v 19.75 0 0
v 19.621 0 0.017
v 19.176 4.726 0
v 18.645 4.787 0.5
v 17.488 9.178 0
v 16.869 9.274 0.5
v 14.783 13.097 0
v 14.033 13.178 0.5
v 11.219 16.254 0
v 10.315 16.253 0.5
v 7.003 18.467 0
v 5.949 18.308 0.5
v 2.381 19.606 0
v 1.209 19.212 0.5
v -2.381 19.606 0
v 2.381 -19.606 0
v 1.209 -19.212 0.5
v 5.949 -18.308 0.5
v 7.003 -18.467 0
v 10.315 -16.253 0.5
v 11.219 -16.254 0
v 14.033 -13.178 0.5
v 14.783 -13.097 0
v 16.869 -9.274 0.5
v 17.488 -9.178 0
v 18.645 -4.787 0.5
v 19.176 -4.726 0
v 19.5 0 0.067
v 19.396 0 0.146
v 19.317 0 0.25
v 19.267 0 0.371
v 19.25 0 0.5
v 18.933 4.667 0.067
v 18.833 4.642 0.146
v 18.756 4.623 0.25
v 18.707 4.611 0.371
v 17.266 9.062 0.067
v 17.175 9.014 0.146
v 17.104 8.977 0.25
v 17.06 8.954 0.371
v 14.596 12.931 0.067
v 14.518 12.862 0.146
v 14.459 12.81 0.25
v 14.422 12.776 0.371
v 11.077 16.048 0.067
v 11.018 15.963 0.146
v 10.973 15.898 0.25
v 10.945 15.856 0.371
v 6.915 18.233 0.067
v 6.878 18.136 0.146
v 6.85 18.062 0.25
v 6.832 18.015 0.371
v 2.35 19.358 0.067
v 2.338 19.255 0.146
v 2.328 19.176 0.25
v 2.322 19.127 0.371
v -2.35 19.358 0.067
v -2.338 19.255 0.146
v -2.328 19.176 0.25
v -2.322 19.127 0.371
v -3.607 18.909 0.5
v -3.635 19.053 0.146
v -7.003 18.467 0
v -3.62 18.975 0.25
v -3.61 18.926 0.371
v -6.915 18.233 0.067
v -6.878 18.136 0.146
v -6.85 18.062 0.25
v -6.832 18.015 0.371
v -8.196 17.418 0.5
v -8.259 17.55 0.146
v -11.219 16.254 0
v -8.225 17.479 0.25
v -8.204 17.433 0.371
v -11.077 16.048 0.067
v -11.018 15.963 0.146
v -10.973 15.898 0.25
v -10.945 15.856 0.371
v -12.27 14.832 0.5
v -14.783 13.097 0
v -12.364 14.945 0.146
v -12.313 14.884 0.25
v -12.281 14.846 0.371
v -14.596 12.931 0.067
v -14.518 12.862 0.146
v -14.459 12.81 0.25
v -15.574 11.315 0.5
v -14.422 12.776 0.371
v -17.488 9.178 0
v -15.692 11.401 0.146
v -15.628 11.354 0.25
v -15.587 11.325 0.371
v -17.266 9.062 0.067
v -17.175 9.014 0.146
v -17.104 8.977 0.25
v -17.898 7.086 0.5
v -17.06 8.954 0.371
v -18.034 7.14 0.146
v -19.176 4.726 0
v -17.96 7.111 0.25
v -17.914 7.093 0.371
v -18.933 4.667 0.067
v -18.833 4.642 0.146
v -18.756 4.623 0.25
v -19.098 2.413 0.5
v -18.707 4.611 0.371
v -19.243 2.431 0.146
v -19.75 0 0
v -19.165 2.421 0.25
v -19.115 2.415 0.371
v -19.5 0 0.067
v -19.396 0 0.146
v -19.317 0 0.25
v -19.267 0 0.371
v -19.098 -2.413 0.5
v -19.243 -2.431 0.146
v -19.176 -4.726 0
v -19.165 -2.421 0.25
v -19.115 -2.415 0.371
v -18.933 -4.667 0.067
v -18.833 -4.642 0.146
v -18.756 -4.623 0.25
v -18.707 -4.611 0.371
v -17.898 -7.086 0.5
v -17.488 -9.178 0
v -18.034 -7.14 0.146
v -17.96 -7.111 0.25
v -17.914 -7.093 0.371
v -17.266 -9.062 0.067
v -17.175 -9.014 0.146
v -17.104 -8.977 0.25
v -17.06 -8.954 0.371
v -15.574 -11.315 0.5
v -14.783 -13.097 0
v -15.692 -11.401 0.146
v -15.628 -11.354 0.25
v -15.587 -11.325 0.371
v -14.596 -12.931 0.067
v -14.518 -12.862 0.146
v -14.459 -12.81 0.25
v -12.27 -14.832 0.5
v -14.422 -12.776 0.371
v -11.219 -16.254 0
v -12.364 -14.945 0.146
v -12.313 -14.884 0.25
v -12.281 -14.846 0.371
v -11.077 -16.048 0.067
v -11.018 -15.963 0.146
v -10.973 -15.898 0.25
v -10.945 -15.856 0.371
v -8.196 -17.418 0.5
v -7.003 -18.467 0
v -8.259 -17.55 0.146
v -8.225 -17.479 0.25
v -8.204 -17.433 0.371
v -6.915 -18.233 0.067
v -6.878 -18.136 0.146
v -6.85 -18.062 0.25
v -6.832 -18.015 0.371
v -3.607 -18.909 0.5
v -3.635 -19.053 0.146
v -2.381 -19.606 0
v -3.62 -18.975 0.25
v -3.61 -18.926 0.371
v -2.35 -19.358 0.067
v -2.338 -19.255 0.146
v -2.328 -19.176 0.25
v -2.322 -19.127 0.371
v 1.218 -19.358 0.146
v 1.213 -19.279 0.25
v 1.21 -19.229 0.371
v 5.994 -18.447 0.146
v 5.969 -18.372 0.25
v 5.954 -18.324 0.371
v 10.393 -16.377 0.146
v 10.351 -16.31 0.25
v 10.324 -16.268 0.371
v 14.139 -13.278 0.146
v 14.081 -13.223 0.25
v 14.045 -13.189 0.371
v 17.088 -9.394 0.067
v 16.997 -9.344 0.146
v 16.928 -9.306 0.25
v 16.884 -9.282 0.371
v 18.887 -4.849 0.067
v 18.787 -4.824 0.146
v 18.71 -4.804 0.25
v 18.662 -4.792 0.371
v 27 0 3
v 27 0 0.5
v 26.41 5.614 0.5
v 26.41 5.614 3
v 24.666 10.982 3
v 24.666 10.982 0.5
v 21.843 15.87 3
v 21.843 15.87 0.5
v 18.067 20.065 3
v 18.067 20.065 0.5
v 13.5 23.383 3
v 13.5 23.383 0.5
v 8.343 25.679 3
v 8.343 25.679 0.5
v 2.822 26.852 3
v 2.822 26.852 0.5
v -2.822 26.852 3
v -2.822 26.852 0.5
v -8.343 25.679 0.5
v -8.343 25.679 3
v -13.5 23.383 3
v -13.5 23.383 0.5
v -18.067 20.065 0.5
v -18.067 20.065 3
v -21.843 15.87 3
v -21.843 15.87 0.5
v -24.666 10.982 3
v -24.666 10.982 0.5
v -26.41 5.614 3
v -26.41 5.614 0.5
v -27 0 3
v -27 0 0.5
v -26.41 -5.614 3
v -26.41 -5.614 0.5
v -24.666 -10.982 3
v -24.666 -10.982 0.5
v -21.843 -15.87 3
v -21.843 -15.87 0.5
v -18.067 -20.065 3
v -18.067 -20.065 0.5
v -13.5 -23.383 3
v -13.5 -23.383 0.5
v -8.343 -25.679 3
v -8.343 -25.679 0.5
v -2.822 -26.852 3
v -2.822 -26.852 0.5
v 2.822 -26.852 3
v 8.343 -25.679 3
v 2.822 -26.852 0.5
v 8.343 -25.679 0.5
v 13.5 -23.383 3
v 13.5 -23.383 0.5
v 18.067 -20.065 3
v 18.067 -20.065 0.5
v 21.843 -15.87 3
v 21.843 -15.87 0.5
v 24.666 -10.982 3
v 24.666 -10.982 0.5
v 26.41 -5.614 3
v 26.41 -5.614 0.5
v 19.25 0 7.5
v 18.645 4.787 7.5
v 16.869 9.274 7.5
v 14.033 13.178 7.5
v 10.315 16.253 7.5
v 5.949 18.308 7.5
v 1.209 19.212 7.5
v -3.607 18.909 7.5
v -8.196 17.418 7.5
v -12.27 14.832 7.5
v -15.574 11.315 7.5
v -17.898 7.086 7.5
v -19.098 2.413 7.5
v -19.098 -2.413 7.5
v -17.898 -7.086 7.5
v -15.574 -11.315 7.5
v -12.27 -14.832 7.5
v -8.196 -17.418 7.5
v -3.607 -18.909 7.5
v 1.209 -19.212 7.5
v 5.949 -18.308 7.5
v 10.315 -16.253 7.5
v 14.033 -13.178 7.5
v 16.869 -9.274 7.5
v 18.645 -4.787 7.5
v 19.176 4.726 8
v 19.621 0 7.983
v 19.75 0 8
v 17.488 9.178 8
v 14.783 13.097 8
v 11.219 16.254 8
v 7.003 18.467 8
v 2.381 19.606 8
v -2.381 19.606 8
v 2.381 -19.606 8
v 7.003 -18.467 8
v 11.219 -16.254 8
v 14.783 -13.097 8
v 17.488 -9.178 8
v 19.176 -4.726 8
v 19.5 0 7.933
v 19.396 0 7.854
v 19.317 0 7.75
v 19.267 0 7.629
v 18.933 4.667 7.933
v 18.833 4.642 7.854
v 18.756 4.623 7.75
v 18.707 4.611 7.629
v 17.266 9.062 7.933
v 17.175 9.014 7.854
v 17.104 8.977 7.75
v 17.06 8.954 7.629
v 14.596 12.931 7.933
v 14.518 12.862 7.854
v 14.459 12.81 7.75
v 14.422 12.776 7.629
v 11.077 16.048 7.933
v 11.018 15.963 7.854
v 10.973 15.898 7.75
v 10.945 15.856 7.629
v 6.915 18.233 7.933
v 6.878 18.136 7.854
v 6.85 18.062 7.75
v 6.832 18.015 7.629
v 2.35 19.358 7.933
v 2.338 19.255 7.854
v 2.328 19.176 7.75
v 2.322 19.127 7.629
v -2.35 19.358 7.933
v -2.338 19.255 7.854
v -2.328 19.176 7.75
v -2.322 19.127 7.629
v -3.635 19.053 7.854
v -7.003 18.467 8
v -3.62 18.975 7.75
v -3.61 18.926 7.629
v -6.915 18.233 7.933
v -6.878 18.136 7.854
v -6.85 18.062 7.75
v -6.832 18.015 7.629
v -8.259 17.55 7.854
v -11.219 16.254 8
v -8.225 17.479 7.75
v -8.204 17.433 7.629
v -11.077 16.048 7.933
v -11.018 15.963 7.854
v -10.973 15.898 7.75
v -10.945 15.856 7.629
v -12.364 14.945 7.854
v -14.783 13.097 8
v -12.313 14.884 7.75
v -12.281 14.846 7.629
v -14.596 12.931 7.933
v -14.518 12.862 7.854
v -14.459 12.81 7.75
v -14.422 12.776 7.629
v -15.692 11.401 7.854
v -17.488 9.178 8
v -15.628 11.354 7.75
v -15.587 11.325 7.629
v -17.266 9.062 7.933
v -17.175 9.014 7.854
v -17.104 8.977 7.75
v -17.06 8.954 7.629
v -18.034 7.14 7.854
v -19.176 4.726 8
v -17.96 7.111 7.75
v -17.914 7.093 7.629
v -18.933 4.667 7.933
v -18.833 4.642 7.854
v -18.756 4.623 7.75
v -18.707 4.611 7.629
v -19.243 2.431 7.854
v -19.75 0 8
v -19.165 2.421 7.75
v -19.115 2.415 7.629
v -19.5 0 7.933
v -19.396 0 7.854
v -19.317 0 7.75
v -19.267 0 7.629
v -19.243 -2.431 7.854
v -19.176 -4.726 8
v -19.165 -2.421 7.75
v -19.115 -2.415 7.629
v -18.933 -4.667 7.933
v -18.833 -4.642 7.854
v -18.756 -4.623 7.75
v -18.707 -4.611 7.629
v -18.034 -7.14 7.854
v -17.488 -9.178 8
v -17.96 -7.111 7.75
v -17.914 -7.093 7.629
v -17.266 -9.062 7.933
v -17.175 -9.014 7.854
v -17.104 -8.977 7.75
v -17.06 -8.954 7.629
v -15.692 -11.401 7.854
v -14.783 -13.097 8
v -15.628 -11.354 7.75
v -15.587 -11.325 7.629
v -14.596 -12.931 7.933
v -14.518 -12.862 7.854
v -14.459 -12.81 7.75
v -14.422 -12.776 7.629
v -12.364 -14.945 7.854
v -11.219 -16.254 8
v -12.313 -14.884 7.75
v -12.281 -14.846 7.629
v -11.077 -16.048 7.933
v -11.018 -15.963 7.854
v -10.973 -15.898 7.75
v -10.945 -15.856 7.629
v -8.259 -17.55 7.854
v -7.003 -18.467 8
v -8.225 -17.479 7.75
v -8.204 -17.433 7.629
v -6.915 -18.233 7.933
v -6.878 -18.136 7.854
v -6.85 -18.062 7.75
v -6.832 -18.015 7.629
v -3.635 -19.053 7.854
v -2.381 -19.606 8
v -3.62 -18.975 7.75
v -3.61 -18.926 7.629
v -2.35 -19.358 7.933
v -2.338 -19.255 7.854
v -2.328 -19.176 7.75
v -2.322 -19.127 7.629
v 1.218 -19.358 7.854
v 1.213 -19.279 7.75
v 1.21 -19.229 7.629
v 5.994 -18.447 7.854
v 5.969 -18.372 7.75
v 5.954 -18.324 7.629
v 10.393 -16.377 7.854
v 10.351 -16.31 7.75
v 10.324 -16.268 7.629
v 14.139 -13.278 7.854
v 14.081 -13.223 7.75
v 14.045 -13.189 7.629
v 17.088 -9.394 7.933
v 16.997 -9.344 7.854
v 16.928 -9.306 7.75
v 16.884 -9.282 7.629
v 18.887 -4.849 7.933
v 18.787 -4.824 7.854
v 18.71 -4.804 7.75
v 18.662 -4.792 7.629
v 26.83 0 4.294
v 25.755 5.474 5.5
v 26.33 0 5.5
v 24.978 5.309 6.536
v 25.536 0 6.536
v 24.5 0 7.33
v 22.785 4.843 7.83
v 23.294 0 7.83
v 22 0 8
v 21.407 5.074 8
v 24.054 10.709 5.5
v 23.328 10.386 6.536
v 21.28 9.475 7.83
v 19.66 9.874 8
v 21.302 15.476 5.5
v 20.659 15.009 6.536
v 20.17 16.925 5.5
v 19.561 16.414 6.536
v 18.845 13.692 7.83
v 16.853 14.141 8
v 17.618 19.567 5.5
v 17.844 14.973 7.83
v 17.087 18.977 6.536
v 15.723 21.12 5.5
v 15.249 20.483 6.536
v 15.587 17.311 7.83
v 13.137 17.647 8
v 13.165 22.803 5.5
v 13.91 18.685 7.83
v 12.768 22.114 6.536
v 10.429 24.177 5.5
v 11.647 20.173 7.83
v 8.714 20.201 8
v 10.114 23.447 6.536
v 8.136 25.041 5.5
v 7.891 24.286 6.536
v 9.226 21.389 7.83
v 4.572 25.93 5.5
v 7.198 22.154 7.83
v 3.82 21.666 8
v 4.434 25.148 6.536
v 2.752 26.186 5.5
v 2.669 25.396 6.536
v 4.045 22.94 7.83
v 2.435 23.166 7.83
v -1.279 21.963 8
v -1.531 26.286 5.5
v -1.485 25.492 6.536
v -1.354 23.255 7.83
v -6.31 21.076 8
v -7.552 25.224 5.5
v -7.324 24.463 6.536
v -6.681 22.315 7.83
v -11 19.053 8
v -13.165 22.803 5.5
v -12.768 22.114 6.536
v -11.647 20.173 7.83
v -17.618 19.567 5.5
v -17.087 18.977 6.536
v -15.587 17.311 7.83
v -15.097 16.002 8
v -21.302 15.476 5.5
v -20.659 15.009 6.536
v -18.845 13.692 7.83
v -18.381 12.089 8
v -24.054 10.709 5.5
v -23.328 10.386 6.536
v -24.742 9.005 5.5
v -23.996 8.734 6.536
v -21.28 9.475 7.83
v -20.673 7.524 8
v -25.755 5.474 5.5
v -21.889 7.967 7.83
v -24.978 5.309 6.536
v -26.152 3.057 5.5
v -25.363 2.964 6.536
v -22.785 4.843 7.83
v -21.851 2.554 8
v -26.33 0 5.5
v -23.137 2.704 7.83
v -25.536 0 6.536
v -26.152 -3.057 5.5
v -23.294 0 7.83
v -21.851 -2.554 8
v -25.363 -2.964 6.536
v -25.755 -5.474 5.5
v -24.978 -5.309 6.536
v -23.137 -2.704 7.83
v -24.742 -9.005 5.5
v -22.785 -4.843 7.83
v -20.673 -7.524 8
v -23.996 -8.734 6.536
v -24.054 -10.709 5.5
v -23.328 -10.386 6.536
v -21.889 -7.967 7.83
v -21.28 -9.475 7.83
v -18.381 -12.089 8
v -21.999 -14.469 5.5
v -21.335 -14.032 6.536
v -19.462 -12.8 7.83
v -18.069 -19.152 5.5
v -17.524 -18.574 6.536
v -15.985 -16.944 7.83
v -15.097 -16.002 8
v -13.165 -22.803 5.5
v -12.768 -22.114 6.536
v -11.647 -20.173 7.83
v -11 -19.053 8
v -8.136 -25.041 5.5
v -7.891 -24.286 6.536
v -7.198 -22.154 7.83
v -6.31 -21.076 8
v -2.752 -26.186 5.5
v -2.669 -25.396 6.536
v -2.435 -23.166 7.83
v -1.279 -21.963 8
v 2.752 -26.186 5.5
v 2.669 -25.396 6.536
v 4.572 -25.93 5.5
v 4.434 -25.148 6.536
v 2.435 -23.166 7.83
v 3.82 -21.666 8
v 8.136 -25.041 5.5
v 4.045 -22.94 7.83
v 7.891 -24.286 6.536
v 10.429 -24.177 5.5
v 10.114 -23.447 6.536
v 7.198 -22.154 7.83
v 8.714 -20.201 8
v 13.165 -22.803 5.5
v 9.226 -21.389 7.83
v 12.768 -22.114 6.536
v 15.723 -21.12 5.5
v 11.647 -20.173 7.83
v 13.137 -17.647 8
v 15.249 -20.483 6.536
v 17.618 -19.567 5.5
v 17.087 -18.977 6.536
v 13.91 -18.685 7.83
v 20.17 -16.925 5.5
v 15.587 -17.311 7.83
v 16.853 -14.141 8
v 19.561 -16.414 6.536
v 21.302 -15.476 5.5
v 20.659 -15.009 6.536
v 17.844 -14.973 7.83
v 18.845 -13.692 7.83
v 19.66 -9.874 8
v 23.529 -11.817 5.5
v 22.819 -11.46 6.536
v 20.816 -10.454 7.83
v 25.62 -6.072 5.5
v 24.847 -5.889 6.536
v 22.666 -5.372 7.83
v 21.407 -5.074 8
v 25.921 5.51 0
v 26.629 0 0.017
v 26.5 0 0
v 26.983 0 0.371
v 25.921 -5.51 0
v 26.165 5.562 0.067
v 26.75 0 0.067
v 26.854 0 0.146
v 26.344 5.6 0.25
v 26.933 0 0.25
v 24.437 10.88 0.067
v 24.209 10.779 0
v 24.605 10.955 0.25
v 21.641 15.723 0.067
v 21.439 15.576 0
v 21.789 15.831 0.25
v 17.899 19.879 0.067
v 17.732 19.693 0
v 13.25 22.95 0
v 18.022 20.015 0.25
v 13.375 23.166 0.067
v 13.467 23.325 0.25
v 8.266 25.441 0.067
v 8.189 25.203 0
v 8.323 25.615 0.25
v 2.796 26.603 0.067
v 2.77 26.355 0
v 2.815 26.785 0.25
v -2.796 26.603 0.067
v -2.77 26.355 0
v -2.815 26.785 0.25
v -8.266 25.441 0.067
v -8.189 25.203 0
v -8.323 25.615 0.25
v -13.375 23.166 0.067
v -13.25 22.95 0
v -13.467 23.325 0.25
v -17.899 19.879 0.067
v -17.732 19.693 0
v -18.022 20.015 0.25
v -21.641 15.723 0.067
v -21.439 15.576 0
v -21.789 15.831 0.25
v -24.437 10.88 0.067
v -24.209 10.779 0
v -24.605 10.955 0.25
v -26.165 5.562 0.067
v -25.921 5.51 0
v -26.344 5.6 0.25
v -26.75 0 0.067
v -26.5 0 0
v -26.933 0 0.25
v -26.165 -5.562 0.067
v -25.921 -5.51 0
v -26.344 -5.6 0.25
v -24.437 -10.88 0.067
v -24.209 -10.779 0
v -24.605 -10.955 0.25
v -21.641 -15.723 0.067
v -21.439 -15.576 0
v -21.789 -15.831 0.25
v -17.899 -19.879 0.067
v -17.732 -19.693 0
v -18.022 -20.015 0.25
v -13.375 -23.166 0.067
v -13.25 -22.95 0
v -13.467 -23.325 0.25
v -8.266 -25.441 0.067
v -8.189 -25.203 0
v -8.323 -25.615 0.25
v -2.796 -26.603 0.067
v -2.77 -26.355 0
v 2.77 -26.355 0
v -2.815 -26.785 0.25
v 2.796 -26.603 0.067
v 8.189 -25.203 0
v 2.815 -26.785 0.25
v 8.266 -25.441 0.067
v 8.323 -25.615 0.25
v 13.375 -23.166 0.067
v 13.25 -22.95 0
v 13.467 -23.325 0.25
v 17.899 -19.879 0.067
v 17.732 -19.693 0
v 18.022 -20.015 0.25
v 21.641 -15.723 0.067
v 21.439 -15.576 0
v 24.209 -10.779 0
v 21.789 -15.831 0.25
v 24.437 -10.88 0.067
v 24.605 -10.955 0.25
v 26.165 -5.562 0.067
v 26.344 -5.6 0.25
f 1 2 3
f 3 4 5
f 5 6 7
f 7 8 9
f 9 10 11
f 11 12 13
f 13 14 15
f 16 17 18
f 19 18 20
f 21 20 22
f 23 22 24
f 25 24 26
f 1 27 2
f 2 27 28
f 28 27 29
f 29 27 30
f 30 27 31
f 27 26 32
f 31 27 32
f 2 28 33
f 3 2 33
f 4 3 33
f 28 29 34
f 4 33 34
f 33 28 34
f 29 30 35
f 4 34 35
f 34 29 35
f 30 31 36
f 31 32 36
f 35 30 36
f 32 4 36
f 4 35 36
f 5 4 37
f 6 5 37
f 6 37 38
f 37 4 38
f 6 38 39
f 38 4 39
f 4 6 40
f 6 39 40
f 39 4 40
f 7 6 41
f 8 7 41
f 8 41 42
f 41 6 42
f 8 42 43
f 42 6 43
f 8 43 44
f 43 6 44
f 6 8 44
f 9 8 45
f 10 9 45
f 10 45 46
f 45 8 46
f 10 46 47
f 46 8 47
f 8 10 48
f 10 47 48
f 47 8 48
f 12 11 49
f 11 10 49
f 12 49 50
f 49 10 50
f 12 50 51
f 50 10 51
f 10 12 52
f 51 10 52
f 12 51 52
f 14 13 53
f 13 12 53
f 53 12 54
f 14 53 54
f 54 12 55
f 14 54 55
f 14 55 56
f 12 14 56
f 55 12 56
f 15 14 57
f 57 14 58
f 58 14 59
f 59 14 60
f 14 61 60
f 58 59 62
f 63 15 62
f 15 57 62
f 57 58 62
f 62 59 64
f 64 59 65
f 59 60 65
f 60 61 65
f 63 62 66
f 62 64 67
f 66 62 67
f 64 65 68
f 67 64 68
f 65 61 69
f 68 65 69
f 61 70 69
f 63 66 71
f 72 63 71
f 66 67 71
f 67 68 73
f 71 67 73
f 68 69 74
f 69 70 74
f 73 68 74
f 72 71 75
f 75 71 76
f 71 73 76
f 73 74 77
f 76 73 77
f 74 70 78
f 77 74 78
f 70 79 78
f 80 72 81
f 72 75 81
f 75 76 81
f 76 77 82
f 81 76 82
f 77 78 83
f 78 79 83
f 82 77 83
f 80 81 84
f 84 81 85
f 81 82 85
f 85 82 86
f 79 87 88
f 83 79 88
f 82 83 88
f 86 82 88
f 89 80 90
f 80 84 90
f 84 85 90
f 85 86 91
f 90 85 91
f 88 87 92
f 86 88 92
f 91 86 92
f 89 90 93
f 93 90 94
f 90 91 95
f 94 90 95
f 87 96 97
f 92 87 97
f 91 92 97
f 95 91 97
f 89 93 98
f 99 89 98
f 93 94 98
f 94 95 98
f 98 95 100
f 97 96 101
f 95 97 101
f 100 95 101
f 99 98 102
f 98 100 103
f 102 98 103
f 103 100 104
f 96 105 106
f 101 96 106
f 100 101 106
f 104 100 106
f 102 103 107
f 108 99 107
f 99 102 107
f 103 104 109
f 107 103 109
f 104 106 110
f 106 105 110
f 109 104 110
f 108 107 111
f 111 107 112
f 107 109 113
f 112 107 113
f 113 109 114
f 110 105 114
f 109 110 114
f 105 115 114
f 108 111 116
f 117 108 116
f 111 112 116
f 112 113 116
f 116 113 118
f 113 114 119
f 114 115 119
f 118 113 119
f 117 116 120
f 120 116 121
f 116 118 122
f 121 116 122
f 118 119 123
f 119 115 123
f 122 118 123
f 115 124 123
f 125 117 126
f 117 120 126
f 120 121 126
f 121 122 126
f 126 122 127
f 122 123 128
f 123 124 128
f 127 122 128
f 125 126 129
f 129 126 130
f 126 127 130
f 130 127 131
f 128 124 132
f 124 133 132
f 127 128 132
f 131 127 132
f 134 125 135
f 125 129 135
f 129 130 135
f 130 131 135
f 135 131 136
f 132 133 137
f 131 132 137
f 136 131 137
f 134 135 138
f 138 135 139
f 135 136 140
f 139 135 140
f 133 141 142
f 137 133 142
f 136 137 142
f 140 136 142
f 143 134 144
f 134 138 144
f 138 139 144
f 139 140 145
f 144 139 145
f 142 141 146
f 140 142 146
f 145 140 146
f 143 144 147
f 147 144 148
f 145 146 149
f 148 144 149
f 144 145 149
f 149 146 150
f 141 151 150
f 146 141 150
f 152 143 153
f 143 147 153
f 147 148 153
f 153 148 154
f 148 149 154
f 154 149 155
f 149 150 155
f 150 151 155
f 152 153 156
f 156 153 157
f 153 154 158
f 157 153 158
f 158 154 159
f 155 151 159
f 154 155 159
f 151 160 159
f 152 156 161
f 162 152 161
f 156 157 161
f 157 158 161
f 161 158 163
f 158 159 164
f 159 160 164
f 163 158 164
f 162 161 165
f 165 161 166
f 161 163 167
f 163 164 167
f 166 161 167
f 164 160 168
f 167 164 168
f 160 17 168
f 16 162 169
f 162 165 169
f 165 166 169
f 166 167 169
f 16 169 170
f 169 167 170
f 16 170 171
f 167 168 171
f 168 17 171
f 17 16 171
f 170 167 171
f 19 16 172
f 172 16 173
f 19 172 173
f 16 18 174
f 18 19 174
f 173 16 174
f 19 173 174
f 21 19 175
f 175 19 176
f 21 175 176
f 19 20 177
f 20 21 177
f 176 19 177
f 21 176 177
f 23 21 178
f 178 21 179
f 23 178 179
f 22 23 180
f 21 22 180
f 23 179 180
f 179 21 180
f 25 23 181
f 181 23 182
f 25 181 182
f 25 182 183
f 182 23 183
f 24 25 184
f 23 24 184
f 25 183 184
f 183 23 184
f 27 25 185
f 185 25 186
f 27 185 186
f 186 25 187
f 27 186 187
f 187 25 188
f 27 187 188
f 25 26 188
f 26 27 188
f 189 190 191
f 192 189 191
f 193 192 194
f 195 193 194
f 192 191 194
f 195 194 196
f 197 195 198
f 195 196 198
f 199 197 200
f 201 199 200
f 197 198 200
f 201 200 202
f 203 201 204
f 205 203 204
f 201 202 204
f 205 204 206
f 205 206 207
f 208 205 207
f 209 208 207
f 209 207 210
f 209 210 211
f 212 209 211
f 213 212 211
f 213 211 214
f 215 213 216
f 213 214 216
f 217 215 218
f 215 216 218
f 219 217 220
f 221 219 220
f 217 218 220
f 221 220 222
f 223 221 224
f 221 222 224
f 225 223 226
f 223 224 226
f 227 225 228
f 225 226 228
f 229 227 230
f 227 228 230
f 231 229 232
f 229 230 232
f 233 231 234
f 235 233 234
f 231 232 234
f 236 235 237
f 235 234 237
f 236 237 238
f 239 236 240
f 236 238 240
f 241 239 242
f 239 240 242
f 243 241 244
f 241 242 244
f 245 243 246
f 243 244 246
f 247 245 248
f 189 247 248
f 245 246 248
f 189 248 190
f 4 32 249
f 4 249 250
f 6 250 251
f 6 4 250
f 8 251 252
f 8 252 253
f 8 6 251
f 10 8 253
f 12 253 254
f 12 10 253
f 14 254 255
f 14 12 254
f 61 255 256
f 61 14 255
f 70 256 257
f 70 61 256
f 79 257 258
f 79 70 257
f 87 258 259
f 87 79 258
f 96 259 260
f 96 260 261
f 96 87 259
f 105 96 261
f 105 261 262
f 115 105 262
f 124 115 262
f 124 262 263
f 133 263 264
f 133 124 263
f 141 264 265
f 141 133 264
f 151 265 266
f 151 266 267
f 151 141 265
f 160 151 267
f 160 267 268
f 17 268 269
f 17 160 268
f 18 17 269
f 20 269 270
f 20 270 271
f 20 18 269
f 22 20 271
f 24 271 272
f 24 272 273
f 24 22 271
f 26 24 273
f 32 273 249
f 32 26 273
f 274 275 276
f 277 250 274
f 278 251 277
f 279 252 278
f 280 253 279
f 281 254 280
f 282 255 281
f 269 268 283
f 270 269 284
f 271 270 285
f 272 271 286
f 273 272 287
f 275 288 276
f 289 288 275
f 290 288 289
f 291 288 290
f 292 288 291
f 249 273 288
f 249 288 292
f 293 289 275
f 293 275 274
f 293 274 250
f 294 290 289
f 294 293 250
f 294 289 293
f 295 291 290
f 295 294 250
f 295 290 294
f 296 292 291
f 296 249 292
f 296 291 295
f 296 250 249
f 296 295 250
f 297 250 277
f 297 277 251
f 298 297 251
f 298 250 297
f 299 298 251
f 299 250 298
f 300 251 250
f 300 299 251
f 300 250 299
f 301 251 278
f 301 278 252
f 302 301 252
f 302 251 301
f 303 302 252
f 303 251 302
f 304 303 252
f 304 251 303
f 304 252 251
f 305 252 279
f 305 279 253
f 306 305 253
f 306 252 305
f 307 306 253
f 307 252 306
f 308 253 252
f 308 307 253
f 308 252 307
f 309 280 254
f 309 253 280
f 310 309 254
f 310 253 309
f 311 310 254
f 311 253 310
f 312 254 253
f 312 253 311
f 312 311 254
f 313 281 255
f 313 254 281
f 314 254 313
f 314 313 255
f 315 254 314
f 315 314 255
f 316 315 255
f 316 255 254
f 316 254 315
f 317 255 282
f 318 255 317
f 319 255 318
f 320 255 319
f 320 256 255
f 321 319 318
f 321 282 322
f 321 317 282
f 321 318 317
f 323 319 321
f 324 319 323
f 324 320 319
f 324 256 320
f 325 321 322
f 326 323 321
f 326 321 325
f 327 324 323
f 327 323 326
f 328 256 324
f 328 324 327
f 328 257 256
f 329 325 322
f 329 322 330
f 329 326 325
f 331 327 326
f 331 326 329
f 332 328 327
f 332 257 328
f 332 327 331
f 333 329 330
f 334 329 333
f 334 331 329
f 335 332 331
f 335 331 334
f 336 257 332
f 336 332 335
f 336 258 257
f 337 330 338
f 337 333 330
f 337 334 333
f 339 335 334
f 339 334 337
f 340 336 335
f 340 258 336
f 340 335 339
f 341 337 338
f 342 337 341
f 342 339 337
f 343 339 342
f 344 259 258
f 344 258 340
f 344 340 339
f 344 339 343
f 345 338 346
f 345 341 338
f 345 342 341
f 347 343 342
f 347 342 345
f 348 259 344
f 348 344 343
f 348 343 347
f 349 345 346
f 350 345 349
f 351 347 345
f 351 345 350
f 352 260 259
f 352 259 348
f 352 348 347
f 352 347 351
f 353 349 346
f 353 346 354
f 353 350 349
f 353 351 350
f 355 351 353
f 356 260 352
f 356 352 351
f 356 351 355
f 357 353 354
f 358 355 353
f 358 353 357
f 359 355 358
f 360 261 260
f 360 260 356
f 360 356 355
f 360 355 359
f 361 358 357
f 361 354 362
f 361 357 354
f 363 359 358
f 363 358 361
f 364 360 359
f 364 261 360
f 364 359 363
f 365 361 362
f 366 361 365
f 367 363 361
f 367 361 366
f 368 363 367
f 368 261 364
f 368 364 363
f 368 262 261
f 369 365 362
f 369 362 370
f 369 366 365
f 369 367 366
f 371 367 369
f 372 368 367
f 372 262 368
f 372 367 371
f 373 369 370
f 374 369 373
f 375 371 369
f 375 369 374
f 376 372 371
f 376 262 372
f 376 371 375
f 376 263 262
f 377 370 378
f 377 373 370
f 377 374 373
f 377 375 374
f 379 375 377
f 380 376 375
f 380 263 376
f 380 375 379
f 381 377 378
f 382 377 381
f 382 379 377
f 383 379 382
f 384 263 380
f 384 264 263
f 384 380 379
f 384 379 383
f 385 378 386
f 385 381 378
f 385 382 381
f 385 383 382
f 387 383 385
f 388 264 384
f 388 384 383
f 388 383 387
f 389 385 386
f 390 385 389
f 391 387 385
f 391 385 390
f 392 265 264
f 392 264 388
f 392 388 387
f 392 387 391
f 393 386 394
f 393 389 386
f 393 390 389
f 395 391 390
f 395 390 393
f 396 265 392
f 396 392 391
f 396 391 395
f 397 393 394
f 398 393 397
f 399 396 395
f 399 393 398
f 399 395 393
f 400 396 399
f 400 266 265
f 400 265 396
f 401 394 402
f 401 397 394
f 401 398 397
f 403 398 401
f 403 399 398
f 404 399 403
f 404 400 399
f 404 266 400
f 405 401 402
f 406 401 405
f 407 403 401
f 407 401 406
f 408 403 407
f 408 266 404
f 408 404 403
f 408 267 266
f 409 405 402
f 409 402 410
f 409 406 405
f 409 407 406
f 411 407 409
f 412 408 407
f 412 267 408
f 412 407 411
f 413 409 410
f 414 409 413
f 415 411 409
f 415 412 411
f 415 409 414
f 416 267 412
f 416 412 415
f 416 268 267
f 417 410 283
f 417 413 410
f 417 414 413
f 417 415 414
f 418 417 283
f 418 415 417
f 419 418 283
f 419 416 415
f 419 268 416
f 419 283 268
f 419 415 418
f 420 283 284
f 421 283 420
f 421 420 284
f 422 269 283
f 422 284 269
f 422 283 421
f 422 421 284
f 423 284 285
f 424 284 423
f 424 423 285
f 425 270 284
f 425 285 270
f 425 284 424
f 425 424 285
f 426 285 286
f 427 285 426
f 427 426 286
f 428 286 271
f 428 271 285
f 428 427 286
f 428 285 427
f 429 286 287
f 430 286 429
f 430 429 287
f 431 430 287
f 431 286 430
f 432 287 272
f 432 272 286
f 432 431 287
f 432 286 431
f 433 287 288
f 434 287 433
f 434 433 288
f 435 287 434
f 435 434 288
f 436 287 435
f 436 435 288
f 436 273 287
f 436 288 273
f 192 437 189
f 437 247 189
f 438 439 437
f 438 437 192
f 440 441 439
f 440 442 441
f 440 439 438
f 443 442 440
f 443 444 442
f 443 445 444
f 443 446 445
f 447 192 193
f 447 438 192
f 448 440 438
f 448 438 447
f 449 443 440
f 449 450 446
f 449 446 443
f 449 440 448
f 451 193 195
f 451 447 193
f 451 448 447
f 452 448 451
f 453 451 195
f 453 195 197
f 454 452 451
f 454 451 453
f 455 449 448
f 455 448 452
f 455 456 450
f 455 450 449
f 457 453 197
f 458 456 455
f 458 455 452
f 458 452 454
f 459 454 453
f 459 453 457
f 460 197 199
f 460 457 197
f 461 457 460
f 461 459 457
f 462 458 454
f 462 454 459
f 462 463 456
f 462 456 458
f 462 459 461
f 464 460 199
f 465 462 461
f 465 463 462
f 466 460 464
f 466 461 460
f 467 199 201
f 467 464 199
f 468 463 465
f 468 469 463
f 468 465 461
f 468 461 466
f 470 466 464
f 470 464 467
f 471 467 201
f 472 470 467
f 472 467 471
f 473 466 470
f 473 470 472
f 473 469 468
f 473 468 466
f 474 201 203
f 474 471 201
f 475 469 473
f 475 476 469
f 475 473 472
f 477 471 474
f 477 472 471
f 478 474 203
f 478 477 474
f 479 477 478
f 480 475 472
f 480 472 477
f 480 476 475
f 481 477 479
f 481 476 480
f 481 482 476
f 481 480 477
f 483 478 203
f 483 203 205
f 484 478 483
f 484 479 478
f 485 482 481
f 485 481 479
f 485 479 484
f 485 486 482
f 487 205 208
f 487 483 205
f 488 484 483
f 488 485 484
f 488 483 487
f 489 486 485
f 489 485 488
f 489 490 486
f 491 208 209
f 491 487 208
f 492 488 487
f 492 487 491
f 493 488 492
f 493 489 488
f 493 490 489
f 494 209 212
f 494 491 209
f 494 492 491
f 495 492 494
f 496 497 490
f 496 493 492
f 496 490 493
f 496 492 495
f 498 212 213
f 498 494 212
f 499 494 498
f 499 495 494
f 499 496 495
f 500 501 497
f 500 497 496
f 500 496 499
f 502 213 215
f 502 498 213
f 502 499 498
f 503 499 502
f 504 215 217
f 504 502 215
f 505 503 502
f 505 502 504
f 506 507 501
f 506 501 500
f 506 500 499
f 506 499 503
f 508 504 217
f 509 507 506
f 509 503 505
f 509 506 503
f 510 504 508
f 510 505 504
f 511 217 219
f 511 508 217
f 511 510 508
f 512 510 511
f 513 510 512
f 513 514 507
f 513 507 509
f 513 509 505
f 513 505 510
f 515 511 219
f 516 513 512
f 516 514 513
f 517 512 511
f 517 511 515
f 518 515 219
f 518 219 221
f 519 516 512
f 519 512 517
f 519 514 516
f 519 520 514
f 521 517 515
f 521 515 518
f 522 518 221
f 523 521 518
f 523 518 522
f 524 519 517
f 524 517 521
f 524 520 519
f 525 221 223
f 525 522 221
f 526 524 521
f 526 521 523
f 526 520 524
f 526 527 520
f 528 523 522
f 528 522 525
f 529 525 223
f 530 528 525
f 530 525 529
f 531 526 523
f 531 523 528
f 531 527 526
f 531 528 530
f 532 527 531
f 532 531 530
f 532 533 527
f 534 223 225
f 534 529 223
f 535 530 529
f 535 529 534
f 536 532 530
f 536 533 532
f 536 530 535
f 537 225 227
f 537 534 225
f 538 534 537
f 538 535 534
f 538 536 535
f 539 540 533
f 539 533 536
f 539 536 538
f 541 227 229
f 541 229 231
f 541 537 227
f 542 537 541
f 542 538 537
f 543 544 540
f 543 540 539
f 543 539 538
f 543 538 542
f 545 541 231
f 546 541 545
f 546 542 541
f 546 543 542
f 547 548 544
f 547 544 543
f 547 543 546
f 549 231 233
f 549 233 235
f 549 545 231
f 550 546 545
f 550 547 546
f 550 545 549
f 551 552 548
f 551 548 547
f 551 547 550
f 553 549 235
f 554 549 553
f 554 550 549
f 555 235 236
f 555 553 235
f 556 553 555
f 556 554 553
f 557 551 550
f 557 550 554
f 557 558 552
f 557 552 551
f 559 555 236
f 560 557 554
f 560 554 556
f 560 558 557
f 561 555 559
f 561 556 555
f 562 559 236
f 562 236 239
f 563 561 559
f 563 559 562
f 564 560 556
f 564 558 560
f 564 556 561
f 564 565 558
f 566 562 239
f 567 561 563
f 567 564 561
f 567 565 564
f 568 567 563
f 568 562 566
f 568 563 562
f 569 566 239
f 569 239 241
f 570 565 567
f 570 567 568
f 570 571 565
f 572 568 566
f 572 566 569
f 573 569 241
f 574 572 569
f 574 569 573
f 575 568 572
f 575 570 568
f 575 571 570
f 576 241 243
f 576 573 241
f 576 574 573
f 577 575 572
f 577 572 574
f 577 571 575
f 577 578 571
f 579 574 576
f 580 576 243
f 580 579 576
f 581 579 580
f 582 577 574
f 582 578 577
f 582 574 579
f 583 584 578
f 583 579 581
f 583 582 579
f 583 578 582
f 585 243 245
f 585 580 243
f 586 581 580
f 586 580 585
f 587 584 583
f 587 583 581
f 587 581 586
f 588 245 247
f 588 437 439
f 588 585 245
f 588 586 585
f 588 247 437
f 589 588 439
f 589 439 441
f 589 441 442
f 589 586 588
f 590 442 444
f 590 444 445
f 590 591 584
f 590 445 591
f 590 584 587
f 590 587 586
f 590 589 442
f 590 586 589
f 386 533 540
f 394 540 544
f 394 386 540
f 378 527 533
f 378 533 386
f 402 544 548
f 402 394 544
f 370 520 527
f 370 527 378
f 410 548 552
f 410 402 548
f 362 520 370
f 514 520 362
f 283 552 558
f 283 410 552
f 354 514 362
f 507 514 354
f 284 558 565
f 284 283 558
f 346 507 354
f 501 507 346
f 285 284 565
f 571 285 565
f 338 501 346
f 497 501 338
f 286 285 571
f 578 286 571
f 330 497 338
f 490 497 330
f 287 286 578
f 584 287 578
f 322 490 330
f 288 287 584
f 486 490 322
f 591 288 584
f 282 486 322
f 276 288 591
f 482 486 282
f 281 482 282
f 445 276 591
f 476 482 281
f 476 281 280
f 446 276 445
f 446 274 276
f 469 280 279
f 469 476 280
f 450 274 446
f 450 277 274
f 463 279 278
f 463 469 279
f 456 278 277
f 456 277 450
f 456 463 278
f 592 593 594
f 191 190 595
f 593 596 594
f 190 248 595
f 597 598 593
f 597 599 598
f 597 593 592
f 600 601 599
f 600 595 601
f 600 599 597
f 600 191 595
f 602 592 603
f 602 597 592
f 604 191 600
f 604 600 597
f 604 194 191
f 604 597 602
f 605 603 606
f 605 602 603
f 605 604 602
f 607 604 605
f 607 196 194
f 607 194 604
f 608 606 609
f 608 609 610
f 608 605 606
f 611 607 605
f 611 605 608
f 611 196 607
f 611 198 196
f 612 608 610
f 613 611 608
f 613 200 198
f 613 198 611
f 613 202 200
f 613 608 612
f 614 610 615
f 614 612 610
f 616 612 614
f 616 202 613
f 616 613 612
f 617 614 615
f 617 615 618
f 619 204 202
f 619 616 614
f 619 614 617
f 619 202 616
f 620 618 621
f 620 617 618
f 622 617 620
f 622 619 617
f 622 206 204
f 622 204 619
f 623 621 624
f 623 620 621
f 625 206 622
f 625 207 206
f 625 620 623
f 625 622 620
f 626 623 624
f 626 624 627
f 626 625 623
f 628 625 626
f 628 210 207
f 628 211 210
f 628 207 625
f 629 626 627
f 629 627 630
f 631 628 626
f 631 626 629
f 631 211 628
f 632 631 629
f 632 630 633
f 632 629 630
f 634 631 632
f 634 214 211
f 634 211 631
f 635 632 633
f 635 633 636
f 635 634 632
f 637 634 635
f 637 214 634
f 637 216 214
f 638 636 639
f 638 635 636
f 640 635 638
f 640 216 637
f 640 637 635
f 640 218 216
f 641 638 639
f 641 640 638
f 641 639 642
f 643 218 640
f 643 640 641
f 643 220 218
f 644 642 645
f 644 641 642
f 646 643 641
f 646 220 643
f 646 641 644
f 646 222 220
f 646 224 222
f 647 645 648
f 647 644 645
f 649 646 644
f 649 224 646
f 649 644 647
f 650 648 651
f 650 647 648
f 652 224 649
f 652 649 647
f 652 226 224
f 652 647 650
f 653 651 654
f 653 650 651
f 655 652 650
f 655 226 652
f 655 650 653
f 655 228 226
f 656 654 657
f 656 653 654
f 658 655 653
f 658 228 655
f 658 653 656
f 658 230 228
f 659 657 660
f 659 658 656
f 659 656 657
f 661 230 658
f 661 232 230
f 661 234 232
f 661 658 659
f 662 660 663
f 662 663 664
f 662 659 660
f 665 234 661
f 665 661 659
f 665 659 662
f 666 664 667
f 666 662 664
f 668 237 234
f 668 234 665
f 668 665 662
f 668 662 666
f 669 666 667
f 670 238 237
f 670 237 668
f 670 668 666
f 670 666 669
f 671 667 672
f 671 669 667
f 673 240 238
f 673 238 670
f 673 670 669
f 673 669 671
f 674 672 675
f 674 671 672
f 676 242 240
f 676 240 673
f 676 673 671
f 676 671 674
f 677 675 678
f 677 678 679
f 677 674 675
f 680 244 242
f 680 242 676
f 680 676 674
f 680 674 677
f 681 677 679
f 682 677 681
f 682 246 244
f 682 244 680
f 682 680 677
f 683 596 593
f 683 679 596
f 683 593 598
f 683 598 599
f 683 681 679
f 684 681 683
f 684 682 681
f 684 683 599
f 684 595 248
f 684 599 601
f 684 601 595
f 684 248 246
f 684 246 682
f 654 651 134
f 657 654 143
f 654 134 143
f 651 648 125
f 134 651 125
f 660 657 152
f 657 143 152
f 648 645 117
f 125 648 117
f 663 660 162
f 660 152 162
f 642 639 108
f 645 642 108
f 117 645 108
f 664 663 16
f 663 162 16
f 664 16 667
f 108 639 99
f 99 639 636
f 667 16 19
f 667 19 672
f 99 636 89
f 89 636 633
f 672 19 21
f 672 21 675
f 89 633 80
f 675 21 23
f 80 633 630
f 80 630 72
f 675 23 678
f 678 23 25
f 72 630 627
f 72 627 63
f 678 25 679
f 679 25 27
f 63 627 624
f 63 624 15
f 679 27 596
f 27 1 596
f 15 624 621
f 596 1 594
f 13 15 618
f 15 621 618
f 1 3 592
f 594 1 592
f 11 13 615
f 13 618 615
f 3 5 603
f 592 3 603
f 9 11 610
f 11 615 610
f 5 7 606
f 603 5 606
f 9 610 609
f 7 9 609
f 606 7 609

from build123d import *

# Parameters (mm, degrees)
F0_R     = 27
F0_R_2   = 19.25
F1_DEPTH = 8
F2_R     = 5
F3_R     = 0.5
F4_R     = 0.5


with BuildPart() as f1:
    # F0 (on Top) → F1 (new body)
    with BuildSketch(Plane.XY):
        Circle(F0_R)
        Circle(F0_R_2, mode=Mode.SUBTRACT)
    extrude(amount=F1_DEPTH)

    # F2
    f2_edges = [f1.edges().sort_by_distance(p)[0] for p in [
        (-27, 0, 8),
    ]]
    fillet(f2_edges, radius=F2_R)

    # F3
    f3_edges = [f1.edges().sort_by_distance(p)[0] for p in [
        (-19.25, 0, 8),
        (-19.25, 0, 0),
    ]]
    fillet(f3_edges, radius=F3_R)

    # F4
    f4_edges = [f1.edges().sort_by_distance(p)[0] for p in [
        (-27, 0, 0),
    ]]
    fillet(f4_edges, radius=F4_R)


solid = f1.part
